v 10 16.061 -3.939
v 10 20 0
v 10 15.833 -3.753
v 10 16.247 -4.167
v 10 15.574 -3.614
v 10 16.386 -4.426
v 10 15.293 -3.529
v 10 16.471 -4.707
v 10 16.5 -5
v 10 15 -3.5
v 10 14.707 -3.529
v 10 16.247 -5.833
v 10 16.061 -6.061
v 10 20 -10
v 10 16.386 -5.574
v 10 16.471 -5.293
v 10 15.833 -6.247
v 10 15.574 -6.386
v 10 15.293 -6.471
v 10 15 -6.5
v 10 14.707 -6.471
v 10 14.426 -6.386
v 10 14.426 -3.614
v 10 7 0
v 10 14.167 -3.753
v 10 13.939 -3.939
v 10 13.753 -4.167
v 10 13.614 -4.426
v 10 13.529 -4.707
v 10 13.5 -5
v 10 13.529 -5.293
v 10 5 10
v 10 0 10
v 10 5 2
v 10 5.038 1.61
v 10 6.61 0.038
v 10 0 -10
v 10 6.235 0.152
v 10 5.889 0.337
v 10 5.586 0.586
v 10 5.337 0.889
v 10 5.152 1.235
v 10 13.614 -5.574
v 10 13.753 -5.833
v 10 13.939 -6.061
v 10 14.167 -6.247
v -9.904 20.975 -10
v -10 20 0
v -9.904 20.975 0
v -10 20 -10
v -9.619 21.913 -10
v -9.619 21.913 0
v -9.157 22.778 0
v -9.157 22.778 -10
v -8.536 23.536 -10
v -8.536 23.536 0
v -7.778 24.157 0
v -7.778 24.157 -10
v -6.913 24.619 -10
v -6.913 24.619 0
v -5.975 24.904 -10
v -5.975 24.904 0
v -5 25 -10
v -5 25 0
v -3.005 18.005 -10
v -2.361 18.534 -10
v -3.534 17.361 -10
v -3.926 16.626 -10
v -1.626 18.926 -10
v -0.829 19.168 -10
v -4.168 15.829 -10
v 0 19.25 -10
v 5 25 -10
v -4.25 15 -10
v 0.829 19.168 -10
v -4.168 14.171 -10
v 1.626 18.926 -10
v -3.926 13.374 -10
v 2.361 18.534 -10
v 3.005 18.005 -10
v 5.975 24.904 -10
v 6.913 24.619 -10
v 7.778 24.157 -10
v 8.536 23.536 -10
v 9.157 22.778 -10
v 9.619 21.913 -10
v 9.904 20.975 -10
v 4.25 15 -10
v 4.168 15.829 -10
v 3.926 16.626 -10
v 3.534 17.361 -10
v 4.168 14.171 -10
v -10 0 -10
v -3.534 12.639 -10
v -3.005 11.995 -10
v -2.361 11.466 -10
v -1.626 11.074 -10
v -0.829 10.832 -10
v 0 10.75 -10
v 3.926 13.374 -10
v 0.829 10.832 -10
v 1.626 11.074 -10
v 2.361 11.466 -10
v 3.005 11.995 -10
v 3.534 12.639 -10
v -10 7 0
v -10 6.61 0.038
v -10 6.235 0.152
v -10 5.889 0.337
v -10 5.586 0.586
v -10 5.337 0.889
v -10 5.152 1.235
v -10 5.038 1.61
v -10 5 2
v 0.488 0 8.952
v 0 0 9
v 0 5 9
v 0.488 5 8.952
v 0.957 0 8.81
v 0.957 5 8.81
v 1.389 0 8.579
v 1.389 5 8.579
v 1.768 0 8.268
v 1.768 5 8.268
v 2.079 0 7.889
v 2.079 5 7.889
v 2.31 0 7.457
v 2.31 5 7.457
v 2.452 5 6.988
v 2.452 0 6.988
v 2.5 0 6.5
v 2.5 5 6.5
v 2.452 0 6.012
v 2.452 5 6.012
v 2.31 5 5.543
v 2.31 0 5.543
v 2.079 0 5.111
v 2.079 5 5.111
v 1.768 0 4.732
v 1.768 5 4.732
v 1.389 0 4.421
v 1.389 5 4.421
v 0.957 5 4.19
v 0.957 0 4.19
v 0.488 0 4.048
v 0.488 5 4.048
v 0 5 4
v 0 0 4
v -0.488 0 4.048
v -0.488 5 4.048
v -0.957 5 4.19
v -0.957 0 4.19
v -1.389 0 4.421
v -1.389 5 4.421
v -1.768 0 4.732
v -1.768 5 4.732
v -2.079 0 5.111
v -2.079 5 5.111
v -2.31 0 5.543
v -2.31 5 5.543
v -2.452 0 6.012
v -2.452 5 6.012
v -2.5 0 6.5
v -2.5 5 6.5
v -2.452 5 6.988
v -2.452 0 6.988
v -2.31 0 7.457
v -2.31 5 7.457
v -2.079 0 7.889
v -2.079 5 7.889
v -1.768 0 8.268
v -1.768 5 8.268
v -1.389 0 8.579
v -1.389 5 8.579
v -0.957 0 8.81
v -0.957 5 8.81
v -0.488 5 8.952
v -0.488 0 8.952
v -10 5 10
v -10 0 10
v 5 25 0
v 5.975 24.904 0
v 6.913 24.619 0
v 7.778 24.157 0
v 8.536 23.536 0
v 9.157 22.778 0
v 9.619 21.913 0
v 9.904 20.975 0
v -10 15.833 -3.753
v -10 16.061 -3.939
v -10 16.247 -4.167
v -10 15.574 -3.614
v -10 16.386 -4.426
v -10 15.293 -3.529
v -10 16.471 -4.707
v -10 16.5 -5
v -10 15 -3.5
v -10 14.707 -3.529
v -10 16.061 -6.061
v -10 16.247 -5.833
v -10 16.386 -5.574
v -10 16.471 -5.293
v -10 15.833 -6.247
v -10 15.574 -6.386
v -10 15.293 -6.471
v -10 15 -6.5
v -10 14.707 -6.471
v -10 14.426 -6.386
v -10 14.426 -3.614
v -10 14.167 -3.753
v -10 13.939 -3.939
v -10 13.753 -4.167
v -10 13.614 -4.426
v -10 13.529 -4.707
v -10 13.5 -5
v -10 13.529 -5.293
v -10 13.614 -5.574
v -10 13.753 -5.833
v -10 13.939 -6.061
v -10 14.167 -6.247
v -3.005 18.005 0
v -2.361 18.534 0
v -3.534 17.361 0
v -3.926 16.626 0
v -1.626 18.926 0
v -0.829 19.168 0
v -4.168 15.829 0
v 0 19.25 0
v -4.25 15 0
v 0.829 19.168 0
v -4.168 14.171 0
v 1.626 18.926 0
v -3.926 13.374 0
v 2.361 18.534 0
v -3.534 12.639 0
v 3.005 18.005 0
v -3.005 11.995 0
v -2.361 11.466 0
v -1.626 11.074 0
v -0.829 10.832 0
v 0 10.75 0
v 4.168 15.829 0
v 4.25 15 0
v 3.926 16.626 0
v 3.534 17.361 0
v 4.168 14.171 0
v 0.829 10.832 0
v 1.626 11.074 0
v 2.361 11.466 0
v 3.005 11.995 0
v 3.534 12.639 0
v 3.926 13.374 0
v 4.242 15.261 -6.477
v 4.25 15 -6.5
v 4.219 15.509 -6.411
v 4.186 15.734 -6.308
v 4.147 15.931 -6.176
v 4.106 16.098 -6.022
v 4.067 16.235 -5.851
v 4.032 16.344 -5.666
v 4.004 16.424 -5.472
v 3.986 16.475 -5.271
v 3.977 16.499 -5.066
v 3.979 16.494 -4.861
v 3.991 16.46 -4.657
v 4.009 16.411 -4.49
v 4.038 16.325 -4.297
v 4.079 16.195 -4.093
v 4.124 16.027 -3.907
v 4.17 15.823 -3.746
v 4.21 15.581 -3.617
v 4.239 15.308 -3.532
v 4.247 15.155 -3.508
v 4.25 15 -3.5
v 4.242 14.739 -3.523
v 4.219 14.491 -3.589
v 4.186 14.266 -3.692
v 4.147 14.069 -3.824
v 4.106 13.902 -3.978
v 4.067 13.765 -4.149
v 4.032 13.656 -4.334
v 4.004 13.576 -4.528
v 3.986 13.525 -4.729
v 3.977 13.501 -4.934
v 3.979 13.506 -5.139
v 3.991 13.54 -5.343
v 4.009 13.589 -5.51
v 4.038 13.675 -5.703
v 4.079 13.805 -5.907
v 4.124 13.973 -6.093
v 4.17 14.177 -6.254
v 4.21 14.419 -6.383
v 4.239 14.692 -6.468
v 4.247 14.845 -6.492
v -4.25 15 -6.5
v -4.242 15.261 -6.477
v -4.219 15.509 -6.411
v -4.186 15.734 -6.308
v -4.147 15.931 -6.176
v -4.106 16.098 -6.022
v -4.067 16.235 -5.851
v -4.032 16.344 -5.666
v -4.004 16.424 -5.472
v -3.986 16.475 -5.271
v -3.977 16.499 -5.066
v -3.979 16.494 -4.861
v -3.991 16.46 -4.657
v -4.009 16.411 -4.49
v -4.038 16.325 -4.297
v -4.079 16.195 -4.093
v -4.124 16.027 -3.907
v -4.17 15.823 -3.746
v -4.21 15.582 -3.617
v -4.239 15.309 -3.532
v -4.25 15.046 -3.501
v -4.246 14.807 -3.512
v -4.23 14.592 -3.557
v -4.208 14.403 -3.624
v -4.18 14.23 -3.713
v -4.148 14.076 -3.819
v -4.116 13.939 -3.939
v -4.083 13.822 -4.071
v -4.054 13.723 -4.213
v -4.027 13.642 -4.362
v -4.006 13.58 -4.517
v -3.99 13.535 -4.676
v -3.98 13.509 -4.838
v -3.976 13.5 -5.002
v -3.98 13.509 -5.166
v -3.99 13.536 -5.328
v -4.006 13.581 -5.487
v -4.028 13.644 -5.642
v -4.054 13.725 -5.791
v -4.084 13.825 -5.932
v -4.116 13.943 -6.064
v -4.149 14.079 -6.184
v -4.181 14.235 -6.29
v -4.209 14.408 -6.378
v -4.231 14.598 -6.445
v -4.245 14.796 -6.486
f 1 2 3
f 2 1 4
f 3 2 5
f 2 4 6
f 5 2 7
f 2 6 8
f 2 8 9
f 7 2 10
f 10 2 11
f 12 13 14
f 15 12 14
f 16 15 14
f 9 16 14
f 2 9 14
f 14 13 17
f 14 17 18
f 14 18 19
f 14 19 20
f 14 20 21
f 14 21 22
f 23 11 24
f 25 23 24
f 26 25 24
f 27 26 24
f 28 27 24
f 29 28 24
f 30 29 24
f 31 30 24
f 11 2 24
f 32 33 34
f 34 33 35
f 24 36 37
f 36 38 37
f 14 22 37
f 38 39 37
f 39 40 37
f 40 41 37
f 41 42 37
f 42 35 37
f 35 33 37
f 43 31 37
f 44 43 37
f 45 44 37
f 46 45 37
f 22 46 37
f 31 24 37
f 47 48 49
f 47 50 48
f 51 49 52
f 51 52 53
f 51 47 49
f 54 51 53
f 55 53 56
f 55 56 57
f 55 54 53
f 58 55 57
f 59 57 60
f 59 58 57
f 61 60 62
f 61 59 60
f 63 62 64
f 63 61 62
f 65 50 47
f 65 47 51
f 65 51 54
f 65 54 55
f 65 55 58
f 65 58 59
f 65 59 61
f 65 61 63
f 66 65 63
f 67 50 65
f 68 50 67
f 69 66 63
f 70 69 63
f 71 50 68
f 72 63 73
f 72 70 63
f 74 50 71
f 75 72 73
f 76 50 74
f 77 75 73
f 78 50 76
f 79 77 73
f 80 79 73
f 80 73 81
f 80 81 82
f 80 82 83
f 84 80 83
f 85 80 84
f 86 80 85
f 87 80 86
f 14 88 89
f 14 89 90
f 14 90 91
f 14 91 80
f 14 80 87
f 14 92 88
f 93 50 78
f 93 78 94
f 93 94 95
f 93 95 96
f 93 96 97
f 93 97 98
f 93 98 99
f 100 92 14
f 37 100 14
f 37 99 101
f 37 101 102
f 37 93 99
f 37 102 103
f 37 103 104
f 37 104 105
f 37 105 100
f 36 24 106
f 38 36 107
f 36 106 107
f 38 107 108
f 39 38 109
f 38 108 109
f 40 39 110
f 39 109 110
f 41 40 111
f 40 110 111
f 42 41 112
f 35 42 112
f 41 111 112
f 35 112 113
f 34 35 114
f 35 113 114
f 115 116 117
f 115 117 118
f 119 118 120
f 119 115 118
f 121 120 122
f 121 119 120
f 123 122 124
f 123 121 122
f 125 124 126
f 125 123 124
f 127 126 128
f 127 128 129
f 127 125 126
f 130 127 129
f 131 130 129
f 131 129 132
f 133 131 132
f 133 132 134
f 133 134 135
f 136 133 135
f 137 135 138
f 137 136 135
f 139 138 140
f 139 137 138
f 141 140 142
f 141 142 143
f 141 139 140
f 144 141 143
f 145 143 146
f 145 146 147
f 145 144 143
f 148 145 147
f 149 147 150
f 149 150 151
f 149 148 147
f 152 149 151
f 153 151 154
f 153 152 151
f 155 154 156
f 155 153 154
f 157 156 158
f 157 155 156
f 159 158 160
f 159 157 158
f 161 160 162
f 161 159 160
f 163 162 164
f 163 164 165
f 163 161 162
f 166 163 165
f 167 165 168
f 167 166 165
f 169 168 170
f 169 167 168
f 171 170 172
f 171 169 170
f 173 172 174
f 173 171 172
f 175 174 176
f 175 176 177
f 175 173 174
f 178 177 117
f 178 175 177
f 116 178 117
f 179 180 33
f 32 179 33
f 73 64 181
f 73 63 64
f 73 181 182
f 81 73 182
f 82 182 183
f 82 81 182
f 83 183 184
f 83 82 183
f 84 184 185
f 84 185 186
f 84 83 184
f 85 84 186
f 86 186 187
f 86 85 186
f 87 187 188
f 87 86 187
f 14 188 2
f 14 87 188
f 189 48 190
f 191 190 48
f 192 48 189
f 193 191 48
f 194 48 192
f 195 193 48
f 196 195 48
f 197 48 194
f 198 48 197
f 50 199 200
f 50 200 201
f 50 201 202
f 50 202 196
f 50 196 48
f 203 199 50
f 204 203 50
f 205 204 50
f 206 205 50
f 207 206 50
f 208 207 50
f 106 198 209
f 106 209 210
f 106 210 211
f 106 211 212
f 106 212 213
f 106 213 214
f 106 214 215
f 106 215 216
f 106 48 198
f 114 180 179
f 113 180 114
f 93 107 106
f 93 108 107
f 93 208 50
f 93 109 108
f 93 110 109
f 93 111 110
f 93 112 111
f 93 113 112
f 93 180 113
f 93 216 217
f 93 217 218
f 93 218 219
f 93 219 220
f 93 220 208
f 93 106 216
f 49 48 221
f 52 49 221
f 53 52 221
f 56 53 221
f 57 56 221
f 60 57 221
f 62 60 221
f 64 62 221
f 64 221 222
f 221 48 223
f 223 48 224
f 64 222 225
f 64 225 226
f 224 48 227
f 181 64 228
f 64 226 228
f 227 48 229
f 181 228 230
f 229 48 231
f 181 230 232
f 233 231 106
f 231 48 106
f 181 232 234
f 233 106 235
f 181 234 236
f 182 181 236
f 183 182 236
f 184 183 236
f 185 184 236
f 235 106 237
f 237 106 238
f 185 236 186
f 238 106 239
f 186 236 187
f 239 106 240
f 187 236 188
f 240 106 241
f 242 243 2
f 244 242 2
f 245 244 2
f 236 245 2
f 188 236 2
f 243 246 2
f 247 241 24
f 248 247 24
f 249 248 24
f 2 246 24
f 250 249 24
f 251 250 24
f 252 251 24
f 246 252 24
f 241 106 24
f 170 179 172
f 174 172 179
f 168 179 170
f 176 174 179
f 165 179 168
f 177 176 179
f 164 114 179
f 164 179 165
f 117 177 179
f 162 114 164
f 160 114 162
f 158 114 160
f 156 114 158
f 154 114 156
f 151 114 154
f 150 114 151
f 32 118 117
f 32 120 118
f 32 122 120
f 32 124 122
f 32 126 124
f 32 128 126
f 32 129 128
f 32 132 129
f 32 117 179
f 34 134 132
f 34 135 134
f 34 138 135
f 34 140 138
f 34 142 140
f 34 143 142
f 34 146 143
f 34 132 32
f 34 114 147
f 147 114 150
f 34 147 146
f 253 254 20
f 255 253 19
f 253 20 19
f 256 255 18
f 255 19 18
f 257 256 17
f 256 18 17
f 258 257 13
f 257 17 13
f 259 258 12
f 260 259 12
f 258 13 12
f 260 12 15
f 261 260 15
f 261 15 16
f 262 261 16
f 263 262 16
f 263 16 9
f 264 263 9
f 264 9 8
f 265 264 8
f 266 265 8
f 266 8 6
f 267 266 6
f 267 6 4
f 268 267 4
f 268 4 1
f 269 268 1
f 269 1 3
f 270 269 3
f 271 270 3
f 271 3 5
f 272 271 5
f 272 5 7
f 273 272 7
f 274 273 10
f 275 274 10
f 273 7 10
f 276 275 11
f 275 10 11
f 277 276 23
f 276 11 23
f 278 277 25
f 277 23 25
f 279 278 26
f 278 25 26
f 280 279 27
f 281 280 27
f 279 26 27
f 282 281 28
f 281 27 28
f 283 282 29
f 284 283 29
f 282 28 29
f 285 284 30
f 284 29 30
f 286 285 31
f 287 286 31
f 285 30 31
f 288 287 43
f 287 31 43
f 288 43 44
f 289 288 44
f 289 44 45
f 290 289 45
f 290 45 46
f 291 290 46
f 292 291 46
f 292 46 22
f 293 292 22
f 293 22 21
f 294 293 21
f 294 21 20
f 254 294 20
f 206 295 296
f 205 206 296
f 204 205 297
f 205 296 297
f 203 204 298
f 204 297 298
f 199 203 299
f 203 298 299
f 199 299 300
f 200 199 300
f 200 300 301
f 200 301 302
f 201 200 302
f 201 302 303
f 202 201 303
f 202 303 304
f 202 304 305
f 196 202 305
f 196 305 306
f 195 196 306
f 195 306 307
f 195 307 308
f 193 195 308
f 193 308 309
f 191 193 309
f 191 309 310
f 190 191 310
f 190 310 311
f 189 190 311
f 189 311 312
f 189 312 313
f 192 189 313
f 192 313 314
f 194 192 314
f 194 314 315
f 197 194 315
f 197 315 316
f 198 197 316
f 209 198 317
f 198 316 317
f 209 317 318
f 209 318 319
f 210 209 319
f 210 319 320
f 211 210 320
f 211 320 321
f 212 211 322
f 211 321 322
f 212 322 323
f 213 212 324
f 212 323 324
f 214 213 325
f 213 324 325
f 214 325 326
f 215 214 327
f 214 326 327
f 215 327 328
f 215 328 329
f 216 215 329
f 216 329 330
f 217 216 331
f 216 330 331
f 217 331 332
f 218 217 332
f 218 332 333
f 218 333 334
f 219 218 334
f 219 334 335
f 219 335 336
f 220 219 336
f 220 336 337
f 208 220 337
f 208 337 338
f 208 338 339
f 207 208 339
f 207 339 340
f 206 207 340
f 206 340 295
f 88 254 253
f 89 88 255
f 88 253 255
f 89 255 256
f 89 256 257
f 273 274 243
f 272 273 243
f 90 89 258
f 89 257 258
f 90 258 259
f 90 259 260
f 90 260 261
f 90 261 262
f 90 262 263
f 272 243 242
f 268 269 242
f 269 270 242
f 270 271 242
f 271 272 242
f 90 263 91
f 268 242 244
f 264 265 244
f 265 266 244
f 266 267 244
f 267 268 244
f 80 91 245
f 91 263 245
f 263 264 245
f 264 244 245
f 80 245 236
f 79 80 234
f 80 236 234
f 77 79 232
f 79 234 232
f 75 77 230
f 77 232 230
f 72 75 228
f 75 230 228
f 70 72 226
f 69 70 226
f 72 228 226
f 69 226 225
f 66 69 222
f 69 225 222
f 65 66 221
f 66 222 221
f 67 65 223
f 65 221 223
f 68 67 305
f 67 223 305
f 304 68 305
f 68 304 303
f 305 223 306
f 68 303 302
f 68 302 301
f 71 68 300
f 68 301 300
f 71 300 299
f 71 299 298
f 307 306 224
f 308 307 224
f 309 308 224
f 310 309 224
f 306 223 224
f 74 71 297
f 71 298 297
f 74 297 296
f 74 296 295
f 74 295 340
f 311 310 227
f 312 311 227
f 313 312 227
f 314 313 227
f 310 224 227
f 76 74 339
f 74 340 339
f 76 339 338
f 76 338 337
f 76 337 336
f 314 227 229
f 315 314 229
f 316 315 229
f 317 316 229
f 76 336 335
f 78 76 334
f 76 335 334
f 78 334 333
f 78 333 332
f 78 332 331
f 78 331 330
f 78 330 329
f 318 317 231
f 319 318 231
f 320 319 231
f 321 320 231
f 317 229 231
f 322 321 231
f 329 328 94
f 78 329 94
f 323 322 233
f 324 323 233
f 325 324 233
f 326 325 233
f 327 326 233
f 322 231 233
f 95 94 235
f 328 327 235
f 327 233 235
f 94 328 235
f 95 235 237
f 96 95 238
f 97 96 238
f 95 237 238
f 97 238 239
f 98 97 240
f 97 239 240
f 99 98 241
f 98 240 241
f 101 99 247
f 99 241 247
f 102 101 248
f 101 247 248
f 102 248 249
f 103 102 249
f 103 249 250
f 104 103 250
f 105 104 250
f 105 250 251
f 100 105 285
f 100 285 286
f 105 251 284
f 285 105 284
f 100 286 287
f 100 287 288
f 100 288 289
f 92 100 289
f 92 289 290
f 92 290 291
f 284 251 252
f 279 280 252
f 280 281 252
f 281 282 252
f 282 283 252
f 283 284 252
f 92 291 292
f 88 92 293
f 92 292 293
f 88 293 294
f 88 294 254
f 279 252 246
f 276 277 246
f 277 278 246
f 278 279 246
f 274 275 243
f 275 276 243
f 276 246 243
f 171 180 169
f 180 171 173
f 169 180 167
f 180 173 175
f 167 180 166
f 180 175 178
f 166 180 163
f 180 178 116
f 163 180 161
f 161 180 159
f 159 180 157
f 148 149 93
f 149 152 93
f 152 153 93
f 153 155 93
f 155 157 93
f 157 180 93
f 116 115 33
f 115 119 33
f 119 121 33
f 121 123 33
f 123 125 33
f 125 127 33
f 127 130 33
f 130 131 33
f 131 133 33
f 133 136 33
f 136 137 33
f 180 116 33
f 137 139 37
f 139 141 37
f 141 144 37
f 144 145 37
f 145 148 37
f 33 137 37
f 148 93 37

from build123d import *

# Parameters (mm, degrees)
SKETCH2_W           = 20
SKETCH2_H           = 20
SKETCH2_R           = 2.5
BOSS_EXTRUDE1_DEPTH = 5
SKETCH2_3_W         = 20
SKETCH2_3_H         = 10
BOSS_EXTRUDE2_DEPTH = 25
SKETCH4_R           = 4.25
CUT_EXTRUDE1_DEPTH  = 88
SKETCH5_R           = 1.5
CUT_EXTRUDE2_DEPTH  = 88
FILLET1_R           = 5
FILLET2_R           = 2


with BuildPart() as part:
    # Sketch2 → Boss-Extrude1 (new body)
    with BuildSketch(Plane(origin=(0, 0, 0), x_dir=(1, 0, 0), z_dir=(0, 1, 0))):
        Rectangle(SKETCH2_W, SKETCH2_H)
        with Locations((0, -6.5)):
            Circle(SKETCH2_R, mode=Mode.SUBTRACT)
    extrude(amount=BOSS_EXTRUDE1_DEPTH)

    # Sketch2<3> → Boss-Extrude2 (add)
    with BuildSketch(Plane(origin=(0, 0, 0), x_dir=(1, 0, 0), z_dir=(0, 1, 0))):
        with Locations((0, 5)):
            Rectangle(SKETCH2_3_W, SKETCH2_3_H)
    extrude(amount=BOSS_EXTRUDE2_DEPTH)

    # Sketch4 → Cut-Extrude1 (cut)
    with BuildSketch(Plane.XY):
        with Locations((0, 15)):
            Circle(SKETCH4_R)
    extrude(amount=-CUT_EXTRUDE1_DEPTH, mode=Mode.SUBTRACT)

    # Sketch5 → Cut-Extrude2 (cut)
    with BuildSketch(Plane(origin=(10, 0, 0), x_dir=(0, 0, -1), z_dir=(1, 0, 0))):
        with Locations((5, 15)):
            Circle(SKETCH5_R)
    extrude(amount=-CUT_EXTRUDE2_DEPTH, mode=Mode.SUBTRACT)

    # Fillet1
    fillet1_edges = [part.edges().sort_by_distance(p)[0] for p in [
        (-10, 25, -5),
        (10, 25, -5),
    ]]
    fillet(fillet1_edges, radius=FILLET1_R)

    # Fillet2
    fillet2_edges = [part.edges().sort_by_distance(p)[0] for p in [
        (0, 5, 0),
    ]]
    fillet(fillet2_edges, radius=FILLET2_R)


solid = part.part
